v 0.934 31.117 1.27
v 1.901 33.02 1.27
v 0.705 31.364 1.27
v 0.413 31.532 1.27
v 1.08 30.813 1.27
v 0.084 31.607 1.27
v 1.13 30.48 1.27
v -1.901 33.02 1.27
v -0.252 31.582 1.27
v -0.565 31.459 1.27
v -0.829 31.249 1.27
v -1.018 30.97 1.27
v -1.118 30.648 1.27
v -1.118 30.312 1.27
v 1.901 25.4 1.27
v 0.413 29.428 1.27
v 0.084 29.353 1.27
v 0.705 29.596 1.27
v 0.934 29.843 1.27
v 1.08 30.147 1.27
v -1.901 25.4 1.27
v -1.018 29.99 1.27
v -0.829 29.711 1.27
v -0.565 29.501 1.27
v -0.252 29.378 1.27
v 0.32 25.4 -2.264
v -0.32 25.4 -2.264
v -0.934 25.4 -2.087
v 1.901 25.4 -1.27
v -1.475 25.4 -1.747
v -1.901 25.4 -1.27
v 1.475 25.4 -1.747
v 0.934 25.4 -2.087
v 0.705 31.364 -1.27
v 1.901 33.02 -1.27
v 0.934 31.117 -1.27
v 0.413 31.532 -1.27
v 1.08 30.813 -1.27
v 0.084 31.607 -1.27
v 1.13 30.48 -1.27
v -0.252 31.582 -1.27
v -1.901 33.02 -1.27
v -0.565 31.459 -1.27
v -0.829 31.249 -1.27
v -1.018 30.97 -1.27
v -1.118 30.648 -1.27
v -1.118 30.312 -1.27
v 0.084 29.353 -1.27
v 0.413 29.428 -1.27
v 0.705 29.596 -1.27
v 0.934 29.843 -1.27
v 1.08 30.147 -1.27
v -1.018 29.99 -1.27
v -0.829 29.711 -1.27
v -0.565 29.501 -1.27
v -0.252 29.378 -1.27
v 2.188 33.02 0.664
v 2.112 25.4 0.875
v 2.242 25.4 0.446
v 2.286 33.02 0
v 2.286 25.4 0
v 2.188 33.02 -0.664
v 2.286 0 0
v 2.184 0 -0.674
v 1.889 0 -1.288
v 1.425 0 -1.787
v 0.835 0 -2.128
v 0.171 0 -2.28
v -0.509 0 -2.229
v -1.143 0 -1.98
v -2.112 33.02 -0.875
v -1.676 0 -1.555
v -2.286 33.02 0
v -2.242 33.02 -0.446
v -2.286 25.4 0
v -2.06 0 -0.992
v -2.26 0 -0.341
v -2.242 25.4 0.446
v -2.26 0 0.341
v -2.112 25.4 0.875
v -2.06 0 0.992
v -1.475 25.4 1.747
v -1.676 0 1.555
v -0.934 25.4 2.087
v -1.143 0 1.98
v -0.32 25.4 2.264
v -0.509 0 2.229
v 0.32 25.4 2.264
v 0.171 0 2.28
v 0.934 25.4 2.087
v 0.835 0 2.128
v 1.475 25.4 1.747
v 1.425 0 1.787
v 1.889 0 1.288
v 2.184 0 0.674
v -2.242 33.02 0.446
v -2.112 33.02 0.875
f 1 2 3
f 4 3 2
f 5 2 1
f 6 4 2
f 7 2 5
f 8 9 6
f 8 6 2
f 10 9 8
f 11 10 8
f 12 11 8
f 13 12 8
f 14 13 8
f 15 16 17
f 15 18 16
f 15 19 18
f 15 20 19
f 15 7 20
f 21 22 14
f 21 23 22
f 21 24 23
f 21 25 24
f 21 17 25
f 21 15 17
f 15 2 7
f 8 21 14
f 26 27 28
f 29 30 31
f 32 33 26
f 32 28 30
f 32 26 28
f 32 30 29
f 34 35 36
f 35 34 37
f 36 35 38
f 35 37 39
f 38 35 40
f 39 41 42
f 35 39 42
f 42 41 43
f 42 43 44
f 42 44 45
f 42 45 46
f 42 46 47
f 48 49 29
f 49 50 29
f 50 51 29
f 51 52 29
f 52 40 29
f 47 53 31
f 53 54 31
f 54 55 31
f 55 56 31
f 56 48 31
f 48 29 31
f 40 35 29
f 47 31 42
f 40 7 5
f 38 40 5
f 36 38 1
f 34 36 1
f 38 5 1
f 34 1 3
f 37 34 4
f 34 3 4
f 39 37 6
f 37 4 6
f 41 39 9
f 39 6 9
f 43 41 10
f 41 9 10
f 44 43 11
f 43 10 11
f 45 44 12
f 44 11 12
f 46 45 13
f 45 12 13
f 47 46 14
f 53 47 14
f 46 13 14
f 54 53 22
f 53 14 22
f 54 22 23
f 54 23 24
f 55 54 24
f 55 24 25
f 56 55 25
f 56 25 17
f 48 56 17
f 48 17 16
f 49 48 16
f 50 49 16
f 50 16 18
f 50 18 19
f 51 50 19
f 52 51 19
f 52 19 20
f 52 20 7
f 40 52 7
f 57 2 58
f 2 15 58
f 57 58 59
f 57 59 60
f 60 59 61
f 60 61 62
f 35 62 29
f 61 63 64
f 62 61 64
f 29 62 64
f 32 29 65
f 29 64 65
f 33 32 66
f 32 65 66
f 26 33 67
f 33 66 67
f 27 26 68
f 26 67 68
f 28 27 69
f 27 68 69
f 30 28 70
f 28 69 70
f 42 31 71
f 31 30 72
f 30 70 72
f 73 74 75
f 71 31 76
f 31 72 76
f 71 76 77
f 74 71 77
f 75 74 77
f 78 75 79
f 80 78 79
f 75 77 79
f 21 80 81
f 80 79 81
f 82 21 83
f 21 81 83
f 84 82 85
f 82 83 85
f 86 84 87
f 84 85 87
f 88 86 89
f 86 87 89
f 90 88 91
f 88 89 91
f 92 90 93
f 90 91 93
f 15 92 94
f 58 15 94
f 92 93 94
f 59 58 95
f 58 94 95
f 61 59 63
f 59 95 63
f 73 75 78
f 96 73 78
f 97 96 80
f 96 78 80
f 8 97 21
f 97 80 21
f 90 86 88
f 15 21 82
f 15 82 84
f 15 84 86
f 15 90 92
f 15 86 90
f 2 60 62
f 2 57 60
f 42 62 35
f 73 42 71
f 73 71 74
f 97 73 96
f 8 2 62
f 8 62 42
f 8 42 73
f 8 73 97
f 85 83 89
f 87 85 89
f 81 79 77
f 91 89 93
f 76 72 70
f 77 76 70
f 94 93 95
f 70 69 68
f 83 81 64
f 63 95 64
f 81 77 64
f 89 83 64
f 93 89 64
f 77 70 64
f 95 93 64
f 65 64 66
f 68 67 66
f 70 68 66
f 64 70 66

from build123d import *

# Parameters (mm, degrees)
SKETCH1_R                  = 2.286
EXTRUDE1_DEPTH             = 25.4
SKETCH2_W                  = 4.572
SKETCH2_H                  = 2.54
EXTRUDE2_DEPTH             = 7.62
SKETCH3_OUTSIDE_W          = 13.302
SKETCH3_OUTSIDE_H          = 13.302
SKETCH3_OUTSIDE_R          = 2.286
CUT_EXTRUDE1_DEPTH         = 7.62
TAP_DRILL_FOR_4_TAP1_D     = 2.2606
TAP_DRILL_FOR_4_TAP1_DEPTH = 6.35
TAP_DRILL_FOR_4_TAP1_TIP   = 0.679152758


with BuildPart() as part:
    # Sketch1 → Extrude1 (new body)
    with BuildSketch(Plane(origin=(0, 0, 0), x_dir=(1, 0, 0), z_dir=(0, 1, 0))):
        Circle(SKETCH1_R)
    extrude(amount=EXTRUDE1_DEPTH)

    # Sketch2 → Extrude2 (add)
    with BuildSketch(Plane(origin=(0, 25.4, 0), x_dir=(-1, 0, 0), z_dir=(0, 1, 0))):
        Rectangle(SKETCH2_W, SKETCH2_H)
    extrude(amount=EXTRUDE2_DEPTH)

    # Sketch3 outside → Cut-Extrude1 (cut)
    with BuildSketch(Plane(origin=(0, 25.4, 0), x_dir=(-1, 0, 0), z_dir=(0, 1, 0))):
        Rectangle(SKETCH3_OUTSIDE_W, SKETCH3_OUTSIDE_H)
        Circle(SKETCH3_OUTSIDE_R, mode=Mode.SUBTRACT)
    extrude(amount=CUT_EXTRUDE1_DEPTH, mode=Mode.SUBTRACT)

    # Tap Drill for #4 Tap1
    with Locations(Plane(origin=(-5.8e-08, 30.48, -1.27), x_dir=(-1, 0, 0), z_dir=(0, 0, -1))):
        with Locations((0, 0)):
            Hole(TAP_DRILL_FOR_4_TAP1_D / 2, depth=TAP_DRILL_FOR_4_TAP1_DEPTH)
            with Locations((0, 0, -(TAP_DRILL_FOR_4_TAP1_DEPTH + TAP_DRILL_FOR_4_TAP1_TIP / 2))):  # 118° drill point
                Cone(0, TAP_DRILL_FOR_4_TAP1_D / 2, TAP_DRILL_FOR_4_TAP1_TIP, mode=Mode.SUBTRACT)


solid = part.part
